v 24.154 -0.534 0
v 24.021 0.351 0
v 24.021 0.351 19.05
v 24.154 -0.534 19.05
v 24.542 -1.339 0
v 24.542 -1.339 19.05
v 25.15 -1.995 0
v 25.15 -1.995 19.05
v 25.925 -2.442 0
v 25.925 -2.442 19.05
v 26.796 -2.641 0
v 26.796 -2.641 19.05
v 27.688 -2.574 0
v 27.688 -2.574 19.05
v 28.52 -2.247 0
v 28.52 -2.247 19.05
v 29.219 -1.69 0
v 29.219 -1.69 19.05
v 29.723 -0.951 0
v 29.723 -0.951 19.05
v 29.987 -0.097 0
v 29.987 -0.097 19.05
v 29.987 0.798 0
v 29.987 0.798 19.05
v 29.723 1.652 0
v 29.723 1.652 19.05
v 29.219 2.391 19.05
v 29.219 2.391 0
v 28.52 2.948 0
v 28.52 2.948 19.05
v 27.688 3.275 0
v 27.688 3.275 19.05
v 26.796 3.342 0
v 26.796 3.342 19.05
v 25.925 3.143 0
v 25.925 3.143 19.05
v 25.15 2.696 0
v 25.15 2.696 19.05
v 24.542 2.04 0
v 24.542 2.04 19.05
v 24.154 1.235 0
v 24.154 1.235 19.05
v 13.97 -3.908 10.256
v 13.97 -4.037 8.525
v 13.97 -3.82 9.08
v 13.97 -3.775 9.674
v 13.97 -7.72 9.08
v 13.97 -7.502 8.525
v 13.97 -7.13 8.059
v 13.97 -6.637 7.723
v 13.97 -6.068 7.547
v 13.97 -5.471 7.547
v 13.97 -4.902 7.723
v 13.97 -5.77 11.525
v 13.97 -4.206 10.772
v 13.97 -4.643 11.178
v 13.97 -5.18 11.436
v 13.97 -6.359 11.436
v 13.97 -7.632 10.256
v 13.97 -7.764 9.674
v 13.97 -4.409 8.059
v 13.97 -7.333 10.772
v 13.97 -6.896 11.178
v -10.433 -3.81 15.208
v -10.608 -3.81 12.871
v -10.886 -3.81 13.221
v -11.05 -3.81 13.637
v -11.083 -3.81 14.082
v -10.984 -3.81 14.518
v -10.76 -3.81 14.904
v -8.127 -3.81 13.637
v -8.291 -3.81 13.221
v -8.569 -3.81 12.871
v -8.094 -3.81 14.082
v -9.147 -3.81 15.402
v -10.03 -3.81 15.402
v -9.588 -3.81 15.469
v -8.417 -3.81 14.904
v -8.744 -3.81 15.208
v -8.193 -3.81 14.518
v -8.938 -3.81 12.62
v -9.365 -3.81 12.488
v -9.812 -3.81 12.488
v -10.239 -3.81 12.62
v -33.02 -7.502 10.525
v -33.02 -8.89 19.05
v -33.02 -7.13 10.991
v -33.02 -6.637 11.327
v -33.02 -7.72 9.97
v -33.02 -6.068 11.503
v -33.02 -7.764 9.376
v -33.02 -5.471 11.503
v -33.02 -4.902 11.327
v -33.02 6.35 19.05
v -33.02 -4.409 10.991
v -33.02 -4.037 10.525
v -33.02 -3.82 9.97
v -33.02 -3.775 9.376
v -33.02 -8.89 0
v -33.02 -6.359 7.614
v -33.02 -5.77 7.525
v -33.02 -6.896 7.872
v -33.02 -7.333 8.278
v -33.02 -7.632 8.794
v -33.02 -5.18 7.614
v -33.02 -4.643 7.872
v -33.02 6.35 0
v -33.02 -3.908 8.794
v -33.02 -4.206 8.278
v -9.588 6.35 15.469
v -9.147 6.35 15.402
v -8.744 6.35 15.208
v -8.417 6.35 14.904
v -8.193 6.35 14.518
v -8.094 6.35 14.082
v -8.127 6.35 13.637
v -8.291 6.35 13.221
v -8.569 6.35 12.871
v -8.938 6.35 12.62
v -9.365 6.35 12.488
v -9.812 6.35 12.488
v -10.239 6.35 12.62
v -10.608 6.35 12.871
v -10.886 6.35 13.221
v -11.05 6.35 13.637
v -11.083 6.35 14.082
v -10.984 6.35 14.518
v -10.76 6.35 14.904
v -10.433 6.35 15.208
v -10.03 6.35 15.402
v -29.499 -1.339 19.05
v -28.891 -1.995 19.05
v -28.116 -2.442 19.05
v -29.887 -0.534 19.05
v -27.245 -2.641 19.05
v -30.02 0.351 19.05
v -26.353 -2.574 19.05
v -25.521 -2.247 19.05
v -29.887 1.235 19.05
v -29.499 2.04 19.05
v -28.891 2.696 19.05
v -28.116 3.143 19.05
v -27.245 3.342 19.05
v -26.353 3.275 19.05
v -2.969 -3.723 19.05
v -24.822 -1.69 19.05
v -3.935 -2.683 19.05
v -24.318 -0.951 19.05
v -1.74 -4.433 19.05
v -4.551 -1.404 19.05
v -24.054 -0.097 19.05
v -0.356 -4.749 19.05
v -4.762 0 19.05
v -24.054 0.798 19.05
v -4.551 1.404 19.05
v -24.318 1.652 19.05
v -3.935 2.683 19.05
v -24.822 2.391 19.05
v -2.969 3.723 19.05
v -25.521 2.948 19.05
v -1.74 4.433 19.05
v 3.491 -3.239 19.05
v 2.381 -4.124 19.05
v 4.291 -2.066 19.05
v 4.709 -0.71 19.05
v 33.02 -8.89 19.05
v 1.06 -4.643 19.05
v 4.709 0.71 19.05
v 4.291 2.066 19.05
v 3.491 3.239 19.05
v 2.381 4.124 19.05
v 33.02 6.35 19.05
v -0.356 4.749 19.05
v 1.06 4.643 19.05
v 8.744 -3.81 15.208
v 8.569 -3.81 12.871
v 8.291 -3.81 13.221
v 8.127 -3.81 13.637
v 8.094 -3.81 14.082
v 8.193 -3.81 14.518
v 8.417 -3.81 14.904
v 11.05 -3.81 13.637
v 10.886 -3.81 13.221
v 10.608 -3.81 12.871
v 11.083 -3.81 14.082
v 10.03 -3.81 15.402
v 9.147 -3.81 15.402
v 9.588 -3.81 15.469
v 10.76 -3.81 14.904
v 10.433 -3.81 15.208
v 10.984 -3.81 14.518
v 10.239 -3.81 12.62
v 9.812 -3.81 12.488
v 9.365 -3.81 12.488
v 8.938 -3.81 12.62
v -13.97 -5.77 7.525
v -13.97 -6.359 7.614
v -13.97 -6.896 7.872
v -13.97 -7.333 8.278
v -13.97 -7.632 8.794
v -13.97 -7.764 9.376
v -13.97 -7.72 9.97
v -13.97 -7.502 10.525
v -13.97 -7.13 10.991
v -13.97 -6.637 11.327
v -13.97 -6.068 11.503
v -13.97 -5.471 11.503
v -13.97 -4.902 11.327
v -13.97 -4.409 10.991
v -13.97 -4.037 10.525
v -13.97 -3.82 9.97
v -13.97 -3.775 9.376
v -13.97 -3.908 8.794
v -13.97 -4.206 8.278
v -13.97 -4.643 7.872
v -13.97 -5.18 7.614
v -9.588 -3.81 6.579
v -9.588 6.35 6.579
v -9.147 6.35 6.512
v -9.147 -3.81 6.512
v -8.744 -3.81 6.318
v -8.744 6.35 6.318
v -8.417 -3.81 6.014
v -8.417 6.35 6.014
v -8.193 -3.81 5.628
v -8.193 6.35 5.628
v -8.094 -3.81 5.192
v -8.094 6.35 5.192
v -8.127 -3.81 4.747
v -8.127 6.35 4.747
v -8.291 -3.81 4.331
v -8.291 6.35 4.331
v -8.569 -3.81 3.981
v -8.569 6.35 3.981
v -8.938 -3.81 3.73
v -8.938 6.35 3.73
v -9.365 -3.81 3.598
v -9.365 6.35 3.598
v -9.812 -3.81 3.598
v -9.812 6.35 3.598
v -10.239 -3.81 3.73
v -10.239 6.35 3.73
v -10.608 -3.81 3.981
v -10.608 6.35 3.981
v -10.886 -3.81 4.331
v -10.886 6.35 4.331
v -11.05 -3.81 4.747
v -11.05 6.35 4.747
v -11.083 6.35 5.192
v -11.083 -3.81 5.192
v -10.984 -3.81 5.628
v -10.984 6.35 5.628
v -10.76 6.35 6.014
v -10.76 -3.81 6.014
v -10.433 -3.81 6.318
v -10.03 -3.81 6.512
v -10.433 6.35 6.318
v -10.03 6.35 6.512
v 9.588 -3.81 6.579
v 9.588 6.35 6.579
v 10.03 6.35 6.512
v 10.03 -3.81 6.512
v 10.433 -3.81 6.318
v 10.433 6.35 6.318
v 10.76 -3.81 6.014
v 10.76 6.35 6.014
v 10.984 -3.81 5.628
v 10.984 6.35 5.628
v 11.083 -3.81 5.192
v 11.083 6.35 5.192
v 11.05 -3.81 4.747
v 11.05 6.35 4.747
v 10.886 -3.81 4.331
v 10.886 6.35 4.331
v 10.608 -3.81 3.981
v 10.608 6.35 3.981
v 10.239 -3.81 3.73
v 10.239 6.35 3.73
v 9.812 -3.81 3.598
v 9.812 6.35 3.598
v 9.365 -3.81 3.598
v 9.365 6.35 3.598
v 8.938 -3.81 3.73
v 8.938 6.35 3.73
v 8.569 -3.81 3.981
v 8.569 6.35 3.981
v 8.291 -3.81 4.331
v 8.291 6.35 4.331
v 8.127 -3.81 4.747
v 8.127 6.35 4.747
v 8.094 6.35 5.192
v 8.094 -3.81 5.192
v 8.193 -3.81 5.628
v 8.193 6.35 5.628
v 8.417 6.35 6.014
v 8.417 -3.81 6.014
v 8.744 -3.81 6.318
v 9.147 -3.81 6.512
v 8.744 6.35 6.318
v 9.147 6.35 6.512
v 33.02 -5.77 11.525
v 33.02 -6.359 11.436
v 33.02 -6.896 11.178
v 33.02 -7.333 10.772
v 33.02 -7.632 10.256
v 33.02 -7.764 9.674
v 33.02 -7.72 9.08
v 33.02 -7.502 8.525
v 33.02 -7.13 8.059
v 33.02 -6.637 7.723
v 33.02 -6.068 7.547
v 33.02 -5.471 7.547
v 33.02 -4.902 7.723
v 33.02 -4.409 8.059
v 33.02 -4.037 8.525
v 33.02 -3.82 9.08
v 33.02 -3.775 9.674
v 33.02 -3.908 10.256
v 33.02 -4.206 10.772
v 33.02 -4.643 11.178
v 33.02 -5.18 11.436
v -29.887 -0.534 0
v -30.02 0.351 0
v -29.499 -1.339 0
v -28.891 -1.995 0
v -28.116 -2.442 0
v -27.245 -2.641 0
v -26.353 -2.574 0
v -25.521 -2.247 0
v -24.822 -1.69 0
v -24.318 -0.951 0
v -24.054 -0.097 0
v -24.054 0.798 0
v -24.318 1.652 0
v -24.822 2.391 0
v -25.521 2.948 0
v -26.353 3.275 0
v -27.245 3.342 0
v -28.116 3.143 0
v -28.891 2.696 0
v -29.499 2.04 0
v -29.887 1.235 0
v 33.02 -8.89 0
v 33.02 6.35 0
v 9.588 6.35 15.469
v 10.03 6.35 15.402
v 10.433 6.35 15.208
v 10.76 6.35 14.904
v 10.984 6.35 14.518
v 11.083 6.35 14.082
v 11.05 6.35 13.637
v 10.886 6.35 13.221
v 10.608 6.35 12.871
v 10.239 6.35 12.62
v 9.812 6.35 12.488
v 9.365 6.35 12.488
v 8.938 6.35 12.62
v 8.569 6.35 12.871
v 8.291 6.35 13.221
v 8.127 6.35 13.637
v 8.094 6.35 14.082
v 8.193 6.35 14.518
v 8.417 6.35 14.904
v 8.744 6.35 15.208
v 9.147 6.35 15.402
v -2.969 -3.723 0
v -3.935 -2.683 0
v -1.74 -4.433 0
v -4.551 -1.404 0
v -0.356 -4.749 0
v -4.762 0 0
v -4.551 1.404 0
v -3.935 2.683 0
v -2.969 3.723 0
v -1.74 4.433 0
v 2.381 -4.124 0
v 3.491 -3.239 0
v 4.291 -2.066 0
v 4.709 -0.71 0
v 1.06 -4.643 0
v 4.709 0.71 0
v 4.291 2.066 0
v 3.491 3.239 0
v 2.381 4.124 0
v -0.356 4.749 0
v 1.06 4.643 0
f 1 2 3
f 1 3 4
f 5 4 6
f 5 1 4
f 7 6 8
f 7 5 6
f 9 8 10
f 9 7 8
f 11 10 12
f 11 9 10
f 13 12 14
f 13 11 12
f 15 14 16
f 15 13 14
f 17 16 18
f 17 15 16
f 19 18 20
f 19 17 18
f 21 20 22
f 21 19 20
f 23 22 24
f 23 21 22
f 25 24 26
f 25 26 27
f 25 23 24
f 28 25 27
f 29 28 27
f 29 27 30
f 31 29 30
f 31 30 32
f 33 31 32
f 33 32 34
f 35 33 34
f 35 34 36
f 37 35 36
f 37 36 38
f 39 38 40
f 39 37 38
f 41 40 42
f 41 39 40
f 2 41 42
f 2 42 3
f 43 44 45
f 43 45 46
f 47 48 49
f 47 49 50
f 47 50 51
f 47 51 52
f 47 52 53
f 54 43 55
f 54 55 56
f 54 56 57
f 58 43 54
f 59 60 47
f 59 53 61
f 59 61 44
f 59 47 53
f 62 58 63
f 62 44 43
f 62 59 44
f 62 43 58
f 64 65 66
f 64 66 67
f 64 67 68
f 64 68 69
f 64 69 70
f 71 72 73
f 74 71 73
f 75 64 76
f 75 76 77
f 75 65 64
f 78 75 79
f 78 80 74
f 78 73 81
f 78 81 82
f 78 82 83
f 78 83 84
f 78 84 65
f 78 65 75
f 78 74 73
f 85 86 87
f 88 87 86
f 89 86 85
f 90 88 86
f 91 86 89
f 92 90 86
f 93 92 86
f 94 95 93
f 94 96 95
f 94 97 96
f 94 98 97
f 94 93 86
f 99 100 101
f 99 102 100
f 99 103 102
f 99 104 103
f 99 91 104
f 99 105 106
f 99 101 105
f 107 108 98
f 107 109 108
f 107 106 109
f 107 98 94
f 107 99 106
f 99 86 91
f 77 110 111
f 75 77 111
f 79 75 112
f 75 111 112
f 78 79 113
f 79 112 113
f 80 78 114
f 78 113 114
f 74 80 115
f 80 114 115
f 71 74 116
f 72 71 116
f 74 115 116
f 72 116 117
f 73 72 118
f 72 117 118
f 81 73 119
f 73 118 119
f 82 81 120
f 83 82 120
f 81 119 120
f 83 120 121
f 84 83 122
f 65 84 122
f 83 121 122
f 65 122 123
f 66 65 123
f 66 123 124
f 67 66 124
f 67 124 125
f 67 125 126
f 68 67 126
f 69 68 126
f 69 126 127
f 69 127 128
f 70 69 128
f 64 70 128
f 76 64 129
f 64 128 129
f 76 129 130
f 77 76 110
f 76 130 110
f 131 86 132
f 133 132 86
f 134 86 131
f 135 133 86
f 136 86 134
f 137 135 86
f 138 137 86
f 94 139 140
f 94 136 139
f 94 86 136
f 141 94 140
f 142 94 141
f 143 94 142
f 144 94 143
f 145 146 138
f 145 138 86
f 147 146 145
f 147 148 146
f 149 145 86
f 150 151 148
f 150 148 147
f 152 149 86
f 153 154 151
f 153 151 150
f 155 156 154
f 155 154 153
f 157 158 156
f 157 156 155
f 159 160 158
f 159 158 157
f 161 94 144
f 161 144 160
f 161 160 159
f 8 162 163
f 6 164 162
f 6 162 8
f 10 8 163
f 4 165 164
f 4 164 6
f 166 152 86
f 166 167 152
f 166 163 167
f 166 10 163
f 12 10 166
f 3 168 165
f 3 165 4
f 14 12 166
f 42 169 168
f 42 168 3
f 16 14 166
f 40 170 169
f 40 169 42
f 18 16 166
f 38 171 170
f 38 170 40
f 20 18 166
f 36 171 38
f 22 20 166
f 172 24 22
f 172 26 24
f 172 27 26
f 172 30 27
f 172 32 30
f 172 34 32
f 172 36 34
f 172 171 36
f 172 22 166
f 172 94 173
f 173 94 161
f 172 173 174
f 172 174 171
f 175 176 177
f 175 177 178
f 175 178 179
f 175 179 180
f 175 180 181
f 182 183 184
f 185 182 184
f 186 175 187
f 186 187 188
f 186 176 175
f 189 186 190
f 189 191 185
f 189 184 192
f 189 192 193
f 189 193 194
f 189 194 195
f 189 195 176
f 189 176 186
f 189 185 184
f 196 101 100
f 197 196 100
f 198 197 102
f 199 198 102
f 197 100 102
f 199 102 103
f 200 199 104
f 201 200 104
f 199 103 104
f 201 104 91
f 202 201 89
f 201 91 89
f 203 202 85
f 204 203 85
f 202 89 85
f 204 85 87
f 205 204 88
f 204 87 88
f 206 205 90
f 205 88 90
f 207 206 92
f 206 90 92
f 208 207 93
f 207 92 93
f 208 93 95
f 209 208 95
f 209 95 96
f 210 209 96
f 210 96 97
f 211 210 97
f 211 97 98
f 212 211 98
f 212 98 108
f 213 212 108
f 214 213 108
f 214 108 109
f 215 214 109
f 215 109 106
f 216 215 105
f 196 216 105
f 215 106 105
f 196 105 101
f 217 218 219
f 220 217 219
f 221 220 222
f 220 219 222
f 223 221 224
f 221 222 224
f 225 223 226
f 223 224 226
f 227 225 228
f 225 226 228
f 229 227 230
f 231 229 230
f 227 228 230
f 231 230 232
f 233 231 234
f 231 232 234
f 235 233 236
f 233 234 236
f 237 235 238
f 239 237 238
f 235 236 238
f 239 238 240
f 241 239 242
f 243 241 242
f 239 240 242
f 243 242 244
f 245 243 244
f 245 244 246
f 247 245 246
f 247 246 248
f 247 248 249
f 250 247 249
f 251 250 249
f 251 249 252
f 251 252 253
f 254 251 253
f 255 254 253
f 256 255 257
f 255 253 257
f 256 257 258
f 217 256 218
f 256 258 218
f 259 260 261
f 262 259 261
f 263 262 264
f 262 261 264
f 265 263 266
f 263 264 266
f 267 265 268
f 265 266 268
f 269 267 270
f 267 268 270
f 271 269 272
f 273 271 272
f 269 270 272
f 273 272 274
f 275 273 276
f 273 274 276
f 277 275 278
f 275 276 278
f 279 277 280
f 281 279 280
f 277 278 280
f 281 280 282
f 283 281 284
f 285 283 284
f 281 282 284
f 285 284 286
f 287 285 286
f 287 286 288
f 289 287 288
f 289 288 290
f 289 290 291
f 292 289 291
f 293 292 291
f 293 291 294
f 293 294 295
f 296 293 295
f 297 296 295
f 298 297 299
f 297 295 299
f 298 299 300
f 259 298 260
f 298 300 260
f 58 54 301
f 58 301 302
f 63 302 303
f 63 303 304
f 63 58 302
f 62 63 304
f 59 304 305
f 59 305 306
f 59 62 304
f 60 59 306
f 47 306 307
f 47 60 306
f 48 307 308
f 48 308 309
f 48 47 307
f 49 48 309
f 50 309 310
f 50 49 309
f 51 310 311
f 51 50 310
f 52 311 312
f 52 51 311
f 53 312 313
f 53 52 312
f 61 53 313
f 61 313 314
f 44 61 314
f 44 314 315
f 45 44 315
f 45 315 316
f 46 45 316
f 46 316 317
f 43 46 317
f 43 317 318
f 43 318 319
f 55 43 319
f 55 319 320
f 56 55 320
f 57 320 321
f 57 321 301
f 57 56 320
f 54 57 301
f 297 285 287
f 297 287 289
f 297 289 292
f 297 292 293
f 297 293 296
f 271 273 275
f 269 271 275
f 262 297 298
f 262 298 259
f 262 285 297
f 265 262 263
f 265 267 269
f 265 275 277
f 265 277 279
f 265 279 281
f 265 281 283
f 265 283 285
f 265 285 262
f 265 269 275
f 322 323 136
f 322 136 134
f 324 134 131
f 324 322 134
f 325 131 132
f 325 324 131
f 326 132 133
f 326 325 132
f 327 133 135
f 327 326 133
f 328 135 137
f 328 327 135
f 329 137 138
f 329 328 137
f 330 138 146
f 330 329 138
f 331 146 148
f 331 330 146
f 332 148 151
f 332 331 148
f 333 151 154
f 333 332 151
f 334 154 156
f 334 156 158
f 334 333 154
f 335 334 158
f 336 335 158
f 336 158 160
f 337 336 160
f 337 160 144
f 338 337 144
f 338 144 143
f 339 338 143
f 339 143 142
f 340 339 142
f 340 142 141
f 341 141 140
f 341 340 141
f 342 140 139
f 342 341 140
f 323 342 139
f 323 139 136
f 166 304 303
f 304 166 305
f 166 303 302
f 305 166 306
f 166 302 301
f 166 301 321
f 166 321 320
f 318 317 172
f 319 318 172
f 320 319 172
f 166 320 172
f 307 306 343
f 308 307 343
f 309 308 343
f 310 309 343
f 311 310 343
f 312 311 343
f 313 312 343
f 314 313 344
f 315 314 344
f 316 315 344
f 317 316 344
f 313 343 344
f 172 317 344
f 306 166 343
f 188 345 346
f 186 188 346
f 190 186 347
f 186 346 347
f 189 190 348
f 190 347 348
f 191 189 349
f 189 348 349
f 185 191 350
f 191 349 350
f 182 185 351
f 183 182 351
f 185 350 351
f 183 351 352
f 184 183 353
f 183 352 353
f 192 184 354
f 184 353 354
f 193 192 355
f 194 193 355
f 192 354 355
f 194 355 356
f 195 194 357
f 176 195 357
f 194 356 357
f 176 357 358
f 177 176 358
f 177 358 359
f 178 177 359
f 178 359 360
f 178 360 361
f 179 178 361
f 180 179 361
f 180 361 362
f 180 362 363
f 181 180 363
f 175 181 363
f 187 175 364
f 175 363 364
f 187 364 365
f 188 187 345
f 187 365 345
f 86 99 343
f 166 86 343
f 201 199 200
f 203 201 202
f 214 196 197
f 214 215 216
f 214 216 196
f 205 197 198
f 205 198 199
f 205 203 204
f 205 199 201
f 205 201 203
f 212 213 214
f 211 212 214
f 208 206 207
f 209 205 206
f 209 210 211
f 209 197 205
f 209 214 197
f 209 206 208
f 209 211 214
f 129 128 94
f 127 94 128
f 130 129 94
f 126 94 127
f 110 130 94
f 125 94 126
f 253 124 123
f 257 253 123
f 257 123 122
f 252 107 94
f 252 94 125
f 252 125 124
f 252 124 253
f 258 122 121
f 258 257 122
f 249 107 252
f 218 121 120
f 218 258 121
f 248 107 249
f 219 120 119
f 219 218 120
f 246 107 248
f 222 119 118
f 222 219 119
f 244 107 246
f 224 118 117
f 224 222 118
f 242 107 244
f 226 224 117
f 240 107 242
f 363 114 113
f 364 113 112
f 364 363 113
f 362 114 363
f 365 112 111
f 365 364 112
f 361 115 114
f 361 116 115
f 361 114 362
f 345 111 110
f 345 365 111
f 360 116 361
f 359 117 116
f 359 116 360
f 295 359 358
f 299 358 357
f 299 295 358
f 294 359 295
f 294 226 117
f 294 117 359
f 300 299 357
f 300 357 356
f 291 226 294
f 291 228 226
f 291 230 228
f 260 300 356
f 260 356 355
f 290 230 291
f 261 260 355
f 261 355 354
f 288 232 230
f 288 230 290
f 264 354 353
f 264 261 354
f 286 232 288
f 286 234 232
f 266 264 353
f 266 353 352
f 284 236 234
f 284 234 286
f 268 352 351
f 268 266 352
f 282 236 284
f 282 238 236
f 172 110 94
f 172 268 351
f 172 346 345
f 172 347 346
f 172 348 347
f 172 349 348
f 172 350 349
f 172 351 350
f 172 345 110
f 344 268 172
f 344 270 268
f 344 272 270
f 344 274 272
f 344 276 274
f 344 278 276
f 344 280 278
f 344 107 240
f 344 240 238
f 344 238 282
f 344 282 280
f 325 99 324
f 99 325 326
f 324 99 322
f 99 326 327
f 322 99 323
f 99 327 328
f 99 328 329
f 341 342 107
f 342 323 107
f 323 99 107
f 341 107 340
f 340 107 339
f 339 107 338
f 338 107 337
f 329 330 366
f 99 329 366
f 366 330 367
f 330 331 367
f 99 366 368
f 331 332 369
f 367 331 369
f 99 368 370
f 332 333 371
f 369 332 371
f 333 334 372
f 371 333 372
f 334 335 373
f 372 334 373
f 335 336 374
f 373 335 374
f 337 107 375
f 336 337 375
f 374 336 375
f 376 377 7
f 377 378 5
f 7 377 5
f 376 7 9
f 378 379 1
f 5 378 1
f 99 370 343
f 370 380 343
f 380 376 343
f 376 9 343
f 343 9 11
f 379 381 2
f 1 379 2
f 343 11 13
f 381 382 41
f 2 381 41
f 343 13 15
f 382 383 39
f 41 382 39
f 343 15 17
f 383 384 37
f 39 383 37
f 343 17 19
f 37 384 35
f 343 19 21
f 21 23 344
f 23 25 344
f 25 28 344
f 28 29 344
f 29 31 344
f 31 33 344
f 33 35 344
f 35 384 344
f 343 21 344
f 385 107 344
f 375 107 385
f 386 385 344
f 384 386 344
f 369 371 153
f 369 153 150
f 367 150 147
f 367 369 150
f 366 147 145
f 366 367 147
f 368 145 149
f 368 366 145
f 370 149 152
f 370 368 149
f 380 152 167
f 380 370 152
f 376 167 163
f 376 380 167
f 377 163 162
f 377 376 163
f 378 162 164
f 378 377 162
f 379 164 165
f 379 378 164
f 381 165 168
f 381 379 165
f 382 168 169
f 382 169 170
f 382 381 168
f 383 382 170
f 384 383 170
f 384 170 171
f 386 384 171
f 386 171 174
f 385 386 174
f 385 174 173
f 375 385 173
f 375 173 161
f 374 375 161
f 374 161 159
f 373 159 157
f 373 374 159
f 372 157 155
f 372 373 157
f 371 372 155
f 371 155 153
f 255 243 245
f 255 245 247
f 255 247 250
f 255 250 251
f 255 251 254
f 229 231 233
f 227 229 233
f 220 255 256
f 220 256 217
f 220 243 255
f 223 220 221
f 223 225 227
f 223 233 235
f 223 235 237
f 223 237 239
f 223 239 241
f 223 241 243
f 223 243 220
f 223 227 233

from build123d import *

# Parameters (mm, degrees)
SKETCH1_W           = 66.04
SKETCH1_H           = 15.24
SKETCH1_R           = 2.99974
SKETCH1_R_2         = 4.7625
BOSS_EXTRUDE1_DEPTH = 19.05
CUT_EXTRUDE2_DEPTH  = 19.05
CUT_EXTRUDE3_START  = -19.05
SKETCH3_R           = 2.00025
CUT_EXTRUDE3_DEPTH  = 19.05
SKETCH4_R           = 1.4986
CUT_EXTRUDE4_DEPTH  = 10.16


with BuildPart() as part:
    # Sketch1 → Boss-Extrude1 (new body)
    with BuildSketch(Plane.XY):
        with Locations((0, -1.27)):
            Rectangle(SKETCH1_W, SKETCH1_H)
        with Locations(Location((-27.02052, 0.35052, 0), (0, 0, 180))):
            Circle(SKETCH1_R, mode=Mode.SUBTRACT)
        with Locations(Location((0, 0, 0), (0, 0, 180))):
            Circle(SKETCH1_R_2, mode=Mode.SUBTRACT)
        with Locations(Location((27.02052, 0.35052, 0), (0, 0, 180))):
            Circle(SKETCH1_R, mode=Mode.SUBTRACT)
    extrude(amount=BOSS_EXTRUDE1_DEPTH)

    # Sketch2 → Cut-Extrude2 (cut)
    with BuildSketch(Plane.ZY.offset(33.02)):
        with BuildLine():
            ThreePointArc((11.52525, -5.76961), (9.525, -3.76936), (7.52475, -5.76961))
            Line((7.52475, -5.76961), (11.52525, -5.76961))
        make_face()
        with BuildLine():
            Line((11.52525, -5.76961), (7.52475, -5.76961))
            ThreePointArc((7.52475, -5.76961), (9.525, -7.76986), (11.52525, -5.76961))
        make_face()
    extrude(amount=-CUT_EXTRUDE2_DEPTH, mode=Mode.SUBTRACT)

    # Sketch3 → Cut-Extrude3 (cut)
    with BuildSketch(Plane(origin=(33.02, 0, 0), x_dir=(0, 0, -1), z_dir=(1, 0, 0)).offset(CUT_EXTRUDE3_START)):
        with Locations(Location((-9.525, -5.76961, 0), (0, 0, 180))):
            Circle(SKETCH3_R)
    extrude(amount=CUT_EXTRUDE3_DEPTH, mode=Mode.SUBTRACT)

    # Sketch4 → Cut-Extrude4 (cut)
    with BuildSketch(Plane(origin=(0, 6.35, 0), x_dir=(1, 0, 0), z_dir=(0, 1, 0))):
        with Locations(Location((9.5885, -5.08, 0), (0, 0, 270))):
            Circle(SKETCH4_R)
        with Locations(Location((9.5885, -13.97, 0), (0, 0, 270))):
            Circle(SKETCH4_R)
        with Locations(Location((-9.5885, -5.08, 0), (0, 0, 270))):
            Circle(SKETCH4_R)
        with Locations(Location((-9.5885, -13.97, 0), (0, 0, 270))):
            Circle(SKETCH4_R)
    extrude(amount=-CUT_EXTRUDE4_DEPTH, mode=Mode.SUBTRACT)


solid = part.part
